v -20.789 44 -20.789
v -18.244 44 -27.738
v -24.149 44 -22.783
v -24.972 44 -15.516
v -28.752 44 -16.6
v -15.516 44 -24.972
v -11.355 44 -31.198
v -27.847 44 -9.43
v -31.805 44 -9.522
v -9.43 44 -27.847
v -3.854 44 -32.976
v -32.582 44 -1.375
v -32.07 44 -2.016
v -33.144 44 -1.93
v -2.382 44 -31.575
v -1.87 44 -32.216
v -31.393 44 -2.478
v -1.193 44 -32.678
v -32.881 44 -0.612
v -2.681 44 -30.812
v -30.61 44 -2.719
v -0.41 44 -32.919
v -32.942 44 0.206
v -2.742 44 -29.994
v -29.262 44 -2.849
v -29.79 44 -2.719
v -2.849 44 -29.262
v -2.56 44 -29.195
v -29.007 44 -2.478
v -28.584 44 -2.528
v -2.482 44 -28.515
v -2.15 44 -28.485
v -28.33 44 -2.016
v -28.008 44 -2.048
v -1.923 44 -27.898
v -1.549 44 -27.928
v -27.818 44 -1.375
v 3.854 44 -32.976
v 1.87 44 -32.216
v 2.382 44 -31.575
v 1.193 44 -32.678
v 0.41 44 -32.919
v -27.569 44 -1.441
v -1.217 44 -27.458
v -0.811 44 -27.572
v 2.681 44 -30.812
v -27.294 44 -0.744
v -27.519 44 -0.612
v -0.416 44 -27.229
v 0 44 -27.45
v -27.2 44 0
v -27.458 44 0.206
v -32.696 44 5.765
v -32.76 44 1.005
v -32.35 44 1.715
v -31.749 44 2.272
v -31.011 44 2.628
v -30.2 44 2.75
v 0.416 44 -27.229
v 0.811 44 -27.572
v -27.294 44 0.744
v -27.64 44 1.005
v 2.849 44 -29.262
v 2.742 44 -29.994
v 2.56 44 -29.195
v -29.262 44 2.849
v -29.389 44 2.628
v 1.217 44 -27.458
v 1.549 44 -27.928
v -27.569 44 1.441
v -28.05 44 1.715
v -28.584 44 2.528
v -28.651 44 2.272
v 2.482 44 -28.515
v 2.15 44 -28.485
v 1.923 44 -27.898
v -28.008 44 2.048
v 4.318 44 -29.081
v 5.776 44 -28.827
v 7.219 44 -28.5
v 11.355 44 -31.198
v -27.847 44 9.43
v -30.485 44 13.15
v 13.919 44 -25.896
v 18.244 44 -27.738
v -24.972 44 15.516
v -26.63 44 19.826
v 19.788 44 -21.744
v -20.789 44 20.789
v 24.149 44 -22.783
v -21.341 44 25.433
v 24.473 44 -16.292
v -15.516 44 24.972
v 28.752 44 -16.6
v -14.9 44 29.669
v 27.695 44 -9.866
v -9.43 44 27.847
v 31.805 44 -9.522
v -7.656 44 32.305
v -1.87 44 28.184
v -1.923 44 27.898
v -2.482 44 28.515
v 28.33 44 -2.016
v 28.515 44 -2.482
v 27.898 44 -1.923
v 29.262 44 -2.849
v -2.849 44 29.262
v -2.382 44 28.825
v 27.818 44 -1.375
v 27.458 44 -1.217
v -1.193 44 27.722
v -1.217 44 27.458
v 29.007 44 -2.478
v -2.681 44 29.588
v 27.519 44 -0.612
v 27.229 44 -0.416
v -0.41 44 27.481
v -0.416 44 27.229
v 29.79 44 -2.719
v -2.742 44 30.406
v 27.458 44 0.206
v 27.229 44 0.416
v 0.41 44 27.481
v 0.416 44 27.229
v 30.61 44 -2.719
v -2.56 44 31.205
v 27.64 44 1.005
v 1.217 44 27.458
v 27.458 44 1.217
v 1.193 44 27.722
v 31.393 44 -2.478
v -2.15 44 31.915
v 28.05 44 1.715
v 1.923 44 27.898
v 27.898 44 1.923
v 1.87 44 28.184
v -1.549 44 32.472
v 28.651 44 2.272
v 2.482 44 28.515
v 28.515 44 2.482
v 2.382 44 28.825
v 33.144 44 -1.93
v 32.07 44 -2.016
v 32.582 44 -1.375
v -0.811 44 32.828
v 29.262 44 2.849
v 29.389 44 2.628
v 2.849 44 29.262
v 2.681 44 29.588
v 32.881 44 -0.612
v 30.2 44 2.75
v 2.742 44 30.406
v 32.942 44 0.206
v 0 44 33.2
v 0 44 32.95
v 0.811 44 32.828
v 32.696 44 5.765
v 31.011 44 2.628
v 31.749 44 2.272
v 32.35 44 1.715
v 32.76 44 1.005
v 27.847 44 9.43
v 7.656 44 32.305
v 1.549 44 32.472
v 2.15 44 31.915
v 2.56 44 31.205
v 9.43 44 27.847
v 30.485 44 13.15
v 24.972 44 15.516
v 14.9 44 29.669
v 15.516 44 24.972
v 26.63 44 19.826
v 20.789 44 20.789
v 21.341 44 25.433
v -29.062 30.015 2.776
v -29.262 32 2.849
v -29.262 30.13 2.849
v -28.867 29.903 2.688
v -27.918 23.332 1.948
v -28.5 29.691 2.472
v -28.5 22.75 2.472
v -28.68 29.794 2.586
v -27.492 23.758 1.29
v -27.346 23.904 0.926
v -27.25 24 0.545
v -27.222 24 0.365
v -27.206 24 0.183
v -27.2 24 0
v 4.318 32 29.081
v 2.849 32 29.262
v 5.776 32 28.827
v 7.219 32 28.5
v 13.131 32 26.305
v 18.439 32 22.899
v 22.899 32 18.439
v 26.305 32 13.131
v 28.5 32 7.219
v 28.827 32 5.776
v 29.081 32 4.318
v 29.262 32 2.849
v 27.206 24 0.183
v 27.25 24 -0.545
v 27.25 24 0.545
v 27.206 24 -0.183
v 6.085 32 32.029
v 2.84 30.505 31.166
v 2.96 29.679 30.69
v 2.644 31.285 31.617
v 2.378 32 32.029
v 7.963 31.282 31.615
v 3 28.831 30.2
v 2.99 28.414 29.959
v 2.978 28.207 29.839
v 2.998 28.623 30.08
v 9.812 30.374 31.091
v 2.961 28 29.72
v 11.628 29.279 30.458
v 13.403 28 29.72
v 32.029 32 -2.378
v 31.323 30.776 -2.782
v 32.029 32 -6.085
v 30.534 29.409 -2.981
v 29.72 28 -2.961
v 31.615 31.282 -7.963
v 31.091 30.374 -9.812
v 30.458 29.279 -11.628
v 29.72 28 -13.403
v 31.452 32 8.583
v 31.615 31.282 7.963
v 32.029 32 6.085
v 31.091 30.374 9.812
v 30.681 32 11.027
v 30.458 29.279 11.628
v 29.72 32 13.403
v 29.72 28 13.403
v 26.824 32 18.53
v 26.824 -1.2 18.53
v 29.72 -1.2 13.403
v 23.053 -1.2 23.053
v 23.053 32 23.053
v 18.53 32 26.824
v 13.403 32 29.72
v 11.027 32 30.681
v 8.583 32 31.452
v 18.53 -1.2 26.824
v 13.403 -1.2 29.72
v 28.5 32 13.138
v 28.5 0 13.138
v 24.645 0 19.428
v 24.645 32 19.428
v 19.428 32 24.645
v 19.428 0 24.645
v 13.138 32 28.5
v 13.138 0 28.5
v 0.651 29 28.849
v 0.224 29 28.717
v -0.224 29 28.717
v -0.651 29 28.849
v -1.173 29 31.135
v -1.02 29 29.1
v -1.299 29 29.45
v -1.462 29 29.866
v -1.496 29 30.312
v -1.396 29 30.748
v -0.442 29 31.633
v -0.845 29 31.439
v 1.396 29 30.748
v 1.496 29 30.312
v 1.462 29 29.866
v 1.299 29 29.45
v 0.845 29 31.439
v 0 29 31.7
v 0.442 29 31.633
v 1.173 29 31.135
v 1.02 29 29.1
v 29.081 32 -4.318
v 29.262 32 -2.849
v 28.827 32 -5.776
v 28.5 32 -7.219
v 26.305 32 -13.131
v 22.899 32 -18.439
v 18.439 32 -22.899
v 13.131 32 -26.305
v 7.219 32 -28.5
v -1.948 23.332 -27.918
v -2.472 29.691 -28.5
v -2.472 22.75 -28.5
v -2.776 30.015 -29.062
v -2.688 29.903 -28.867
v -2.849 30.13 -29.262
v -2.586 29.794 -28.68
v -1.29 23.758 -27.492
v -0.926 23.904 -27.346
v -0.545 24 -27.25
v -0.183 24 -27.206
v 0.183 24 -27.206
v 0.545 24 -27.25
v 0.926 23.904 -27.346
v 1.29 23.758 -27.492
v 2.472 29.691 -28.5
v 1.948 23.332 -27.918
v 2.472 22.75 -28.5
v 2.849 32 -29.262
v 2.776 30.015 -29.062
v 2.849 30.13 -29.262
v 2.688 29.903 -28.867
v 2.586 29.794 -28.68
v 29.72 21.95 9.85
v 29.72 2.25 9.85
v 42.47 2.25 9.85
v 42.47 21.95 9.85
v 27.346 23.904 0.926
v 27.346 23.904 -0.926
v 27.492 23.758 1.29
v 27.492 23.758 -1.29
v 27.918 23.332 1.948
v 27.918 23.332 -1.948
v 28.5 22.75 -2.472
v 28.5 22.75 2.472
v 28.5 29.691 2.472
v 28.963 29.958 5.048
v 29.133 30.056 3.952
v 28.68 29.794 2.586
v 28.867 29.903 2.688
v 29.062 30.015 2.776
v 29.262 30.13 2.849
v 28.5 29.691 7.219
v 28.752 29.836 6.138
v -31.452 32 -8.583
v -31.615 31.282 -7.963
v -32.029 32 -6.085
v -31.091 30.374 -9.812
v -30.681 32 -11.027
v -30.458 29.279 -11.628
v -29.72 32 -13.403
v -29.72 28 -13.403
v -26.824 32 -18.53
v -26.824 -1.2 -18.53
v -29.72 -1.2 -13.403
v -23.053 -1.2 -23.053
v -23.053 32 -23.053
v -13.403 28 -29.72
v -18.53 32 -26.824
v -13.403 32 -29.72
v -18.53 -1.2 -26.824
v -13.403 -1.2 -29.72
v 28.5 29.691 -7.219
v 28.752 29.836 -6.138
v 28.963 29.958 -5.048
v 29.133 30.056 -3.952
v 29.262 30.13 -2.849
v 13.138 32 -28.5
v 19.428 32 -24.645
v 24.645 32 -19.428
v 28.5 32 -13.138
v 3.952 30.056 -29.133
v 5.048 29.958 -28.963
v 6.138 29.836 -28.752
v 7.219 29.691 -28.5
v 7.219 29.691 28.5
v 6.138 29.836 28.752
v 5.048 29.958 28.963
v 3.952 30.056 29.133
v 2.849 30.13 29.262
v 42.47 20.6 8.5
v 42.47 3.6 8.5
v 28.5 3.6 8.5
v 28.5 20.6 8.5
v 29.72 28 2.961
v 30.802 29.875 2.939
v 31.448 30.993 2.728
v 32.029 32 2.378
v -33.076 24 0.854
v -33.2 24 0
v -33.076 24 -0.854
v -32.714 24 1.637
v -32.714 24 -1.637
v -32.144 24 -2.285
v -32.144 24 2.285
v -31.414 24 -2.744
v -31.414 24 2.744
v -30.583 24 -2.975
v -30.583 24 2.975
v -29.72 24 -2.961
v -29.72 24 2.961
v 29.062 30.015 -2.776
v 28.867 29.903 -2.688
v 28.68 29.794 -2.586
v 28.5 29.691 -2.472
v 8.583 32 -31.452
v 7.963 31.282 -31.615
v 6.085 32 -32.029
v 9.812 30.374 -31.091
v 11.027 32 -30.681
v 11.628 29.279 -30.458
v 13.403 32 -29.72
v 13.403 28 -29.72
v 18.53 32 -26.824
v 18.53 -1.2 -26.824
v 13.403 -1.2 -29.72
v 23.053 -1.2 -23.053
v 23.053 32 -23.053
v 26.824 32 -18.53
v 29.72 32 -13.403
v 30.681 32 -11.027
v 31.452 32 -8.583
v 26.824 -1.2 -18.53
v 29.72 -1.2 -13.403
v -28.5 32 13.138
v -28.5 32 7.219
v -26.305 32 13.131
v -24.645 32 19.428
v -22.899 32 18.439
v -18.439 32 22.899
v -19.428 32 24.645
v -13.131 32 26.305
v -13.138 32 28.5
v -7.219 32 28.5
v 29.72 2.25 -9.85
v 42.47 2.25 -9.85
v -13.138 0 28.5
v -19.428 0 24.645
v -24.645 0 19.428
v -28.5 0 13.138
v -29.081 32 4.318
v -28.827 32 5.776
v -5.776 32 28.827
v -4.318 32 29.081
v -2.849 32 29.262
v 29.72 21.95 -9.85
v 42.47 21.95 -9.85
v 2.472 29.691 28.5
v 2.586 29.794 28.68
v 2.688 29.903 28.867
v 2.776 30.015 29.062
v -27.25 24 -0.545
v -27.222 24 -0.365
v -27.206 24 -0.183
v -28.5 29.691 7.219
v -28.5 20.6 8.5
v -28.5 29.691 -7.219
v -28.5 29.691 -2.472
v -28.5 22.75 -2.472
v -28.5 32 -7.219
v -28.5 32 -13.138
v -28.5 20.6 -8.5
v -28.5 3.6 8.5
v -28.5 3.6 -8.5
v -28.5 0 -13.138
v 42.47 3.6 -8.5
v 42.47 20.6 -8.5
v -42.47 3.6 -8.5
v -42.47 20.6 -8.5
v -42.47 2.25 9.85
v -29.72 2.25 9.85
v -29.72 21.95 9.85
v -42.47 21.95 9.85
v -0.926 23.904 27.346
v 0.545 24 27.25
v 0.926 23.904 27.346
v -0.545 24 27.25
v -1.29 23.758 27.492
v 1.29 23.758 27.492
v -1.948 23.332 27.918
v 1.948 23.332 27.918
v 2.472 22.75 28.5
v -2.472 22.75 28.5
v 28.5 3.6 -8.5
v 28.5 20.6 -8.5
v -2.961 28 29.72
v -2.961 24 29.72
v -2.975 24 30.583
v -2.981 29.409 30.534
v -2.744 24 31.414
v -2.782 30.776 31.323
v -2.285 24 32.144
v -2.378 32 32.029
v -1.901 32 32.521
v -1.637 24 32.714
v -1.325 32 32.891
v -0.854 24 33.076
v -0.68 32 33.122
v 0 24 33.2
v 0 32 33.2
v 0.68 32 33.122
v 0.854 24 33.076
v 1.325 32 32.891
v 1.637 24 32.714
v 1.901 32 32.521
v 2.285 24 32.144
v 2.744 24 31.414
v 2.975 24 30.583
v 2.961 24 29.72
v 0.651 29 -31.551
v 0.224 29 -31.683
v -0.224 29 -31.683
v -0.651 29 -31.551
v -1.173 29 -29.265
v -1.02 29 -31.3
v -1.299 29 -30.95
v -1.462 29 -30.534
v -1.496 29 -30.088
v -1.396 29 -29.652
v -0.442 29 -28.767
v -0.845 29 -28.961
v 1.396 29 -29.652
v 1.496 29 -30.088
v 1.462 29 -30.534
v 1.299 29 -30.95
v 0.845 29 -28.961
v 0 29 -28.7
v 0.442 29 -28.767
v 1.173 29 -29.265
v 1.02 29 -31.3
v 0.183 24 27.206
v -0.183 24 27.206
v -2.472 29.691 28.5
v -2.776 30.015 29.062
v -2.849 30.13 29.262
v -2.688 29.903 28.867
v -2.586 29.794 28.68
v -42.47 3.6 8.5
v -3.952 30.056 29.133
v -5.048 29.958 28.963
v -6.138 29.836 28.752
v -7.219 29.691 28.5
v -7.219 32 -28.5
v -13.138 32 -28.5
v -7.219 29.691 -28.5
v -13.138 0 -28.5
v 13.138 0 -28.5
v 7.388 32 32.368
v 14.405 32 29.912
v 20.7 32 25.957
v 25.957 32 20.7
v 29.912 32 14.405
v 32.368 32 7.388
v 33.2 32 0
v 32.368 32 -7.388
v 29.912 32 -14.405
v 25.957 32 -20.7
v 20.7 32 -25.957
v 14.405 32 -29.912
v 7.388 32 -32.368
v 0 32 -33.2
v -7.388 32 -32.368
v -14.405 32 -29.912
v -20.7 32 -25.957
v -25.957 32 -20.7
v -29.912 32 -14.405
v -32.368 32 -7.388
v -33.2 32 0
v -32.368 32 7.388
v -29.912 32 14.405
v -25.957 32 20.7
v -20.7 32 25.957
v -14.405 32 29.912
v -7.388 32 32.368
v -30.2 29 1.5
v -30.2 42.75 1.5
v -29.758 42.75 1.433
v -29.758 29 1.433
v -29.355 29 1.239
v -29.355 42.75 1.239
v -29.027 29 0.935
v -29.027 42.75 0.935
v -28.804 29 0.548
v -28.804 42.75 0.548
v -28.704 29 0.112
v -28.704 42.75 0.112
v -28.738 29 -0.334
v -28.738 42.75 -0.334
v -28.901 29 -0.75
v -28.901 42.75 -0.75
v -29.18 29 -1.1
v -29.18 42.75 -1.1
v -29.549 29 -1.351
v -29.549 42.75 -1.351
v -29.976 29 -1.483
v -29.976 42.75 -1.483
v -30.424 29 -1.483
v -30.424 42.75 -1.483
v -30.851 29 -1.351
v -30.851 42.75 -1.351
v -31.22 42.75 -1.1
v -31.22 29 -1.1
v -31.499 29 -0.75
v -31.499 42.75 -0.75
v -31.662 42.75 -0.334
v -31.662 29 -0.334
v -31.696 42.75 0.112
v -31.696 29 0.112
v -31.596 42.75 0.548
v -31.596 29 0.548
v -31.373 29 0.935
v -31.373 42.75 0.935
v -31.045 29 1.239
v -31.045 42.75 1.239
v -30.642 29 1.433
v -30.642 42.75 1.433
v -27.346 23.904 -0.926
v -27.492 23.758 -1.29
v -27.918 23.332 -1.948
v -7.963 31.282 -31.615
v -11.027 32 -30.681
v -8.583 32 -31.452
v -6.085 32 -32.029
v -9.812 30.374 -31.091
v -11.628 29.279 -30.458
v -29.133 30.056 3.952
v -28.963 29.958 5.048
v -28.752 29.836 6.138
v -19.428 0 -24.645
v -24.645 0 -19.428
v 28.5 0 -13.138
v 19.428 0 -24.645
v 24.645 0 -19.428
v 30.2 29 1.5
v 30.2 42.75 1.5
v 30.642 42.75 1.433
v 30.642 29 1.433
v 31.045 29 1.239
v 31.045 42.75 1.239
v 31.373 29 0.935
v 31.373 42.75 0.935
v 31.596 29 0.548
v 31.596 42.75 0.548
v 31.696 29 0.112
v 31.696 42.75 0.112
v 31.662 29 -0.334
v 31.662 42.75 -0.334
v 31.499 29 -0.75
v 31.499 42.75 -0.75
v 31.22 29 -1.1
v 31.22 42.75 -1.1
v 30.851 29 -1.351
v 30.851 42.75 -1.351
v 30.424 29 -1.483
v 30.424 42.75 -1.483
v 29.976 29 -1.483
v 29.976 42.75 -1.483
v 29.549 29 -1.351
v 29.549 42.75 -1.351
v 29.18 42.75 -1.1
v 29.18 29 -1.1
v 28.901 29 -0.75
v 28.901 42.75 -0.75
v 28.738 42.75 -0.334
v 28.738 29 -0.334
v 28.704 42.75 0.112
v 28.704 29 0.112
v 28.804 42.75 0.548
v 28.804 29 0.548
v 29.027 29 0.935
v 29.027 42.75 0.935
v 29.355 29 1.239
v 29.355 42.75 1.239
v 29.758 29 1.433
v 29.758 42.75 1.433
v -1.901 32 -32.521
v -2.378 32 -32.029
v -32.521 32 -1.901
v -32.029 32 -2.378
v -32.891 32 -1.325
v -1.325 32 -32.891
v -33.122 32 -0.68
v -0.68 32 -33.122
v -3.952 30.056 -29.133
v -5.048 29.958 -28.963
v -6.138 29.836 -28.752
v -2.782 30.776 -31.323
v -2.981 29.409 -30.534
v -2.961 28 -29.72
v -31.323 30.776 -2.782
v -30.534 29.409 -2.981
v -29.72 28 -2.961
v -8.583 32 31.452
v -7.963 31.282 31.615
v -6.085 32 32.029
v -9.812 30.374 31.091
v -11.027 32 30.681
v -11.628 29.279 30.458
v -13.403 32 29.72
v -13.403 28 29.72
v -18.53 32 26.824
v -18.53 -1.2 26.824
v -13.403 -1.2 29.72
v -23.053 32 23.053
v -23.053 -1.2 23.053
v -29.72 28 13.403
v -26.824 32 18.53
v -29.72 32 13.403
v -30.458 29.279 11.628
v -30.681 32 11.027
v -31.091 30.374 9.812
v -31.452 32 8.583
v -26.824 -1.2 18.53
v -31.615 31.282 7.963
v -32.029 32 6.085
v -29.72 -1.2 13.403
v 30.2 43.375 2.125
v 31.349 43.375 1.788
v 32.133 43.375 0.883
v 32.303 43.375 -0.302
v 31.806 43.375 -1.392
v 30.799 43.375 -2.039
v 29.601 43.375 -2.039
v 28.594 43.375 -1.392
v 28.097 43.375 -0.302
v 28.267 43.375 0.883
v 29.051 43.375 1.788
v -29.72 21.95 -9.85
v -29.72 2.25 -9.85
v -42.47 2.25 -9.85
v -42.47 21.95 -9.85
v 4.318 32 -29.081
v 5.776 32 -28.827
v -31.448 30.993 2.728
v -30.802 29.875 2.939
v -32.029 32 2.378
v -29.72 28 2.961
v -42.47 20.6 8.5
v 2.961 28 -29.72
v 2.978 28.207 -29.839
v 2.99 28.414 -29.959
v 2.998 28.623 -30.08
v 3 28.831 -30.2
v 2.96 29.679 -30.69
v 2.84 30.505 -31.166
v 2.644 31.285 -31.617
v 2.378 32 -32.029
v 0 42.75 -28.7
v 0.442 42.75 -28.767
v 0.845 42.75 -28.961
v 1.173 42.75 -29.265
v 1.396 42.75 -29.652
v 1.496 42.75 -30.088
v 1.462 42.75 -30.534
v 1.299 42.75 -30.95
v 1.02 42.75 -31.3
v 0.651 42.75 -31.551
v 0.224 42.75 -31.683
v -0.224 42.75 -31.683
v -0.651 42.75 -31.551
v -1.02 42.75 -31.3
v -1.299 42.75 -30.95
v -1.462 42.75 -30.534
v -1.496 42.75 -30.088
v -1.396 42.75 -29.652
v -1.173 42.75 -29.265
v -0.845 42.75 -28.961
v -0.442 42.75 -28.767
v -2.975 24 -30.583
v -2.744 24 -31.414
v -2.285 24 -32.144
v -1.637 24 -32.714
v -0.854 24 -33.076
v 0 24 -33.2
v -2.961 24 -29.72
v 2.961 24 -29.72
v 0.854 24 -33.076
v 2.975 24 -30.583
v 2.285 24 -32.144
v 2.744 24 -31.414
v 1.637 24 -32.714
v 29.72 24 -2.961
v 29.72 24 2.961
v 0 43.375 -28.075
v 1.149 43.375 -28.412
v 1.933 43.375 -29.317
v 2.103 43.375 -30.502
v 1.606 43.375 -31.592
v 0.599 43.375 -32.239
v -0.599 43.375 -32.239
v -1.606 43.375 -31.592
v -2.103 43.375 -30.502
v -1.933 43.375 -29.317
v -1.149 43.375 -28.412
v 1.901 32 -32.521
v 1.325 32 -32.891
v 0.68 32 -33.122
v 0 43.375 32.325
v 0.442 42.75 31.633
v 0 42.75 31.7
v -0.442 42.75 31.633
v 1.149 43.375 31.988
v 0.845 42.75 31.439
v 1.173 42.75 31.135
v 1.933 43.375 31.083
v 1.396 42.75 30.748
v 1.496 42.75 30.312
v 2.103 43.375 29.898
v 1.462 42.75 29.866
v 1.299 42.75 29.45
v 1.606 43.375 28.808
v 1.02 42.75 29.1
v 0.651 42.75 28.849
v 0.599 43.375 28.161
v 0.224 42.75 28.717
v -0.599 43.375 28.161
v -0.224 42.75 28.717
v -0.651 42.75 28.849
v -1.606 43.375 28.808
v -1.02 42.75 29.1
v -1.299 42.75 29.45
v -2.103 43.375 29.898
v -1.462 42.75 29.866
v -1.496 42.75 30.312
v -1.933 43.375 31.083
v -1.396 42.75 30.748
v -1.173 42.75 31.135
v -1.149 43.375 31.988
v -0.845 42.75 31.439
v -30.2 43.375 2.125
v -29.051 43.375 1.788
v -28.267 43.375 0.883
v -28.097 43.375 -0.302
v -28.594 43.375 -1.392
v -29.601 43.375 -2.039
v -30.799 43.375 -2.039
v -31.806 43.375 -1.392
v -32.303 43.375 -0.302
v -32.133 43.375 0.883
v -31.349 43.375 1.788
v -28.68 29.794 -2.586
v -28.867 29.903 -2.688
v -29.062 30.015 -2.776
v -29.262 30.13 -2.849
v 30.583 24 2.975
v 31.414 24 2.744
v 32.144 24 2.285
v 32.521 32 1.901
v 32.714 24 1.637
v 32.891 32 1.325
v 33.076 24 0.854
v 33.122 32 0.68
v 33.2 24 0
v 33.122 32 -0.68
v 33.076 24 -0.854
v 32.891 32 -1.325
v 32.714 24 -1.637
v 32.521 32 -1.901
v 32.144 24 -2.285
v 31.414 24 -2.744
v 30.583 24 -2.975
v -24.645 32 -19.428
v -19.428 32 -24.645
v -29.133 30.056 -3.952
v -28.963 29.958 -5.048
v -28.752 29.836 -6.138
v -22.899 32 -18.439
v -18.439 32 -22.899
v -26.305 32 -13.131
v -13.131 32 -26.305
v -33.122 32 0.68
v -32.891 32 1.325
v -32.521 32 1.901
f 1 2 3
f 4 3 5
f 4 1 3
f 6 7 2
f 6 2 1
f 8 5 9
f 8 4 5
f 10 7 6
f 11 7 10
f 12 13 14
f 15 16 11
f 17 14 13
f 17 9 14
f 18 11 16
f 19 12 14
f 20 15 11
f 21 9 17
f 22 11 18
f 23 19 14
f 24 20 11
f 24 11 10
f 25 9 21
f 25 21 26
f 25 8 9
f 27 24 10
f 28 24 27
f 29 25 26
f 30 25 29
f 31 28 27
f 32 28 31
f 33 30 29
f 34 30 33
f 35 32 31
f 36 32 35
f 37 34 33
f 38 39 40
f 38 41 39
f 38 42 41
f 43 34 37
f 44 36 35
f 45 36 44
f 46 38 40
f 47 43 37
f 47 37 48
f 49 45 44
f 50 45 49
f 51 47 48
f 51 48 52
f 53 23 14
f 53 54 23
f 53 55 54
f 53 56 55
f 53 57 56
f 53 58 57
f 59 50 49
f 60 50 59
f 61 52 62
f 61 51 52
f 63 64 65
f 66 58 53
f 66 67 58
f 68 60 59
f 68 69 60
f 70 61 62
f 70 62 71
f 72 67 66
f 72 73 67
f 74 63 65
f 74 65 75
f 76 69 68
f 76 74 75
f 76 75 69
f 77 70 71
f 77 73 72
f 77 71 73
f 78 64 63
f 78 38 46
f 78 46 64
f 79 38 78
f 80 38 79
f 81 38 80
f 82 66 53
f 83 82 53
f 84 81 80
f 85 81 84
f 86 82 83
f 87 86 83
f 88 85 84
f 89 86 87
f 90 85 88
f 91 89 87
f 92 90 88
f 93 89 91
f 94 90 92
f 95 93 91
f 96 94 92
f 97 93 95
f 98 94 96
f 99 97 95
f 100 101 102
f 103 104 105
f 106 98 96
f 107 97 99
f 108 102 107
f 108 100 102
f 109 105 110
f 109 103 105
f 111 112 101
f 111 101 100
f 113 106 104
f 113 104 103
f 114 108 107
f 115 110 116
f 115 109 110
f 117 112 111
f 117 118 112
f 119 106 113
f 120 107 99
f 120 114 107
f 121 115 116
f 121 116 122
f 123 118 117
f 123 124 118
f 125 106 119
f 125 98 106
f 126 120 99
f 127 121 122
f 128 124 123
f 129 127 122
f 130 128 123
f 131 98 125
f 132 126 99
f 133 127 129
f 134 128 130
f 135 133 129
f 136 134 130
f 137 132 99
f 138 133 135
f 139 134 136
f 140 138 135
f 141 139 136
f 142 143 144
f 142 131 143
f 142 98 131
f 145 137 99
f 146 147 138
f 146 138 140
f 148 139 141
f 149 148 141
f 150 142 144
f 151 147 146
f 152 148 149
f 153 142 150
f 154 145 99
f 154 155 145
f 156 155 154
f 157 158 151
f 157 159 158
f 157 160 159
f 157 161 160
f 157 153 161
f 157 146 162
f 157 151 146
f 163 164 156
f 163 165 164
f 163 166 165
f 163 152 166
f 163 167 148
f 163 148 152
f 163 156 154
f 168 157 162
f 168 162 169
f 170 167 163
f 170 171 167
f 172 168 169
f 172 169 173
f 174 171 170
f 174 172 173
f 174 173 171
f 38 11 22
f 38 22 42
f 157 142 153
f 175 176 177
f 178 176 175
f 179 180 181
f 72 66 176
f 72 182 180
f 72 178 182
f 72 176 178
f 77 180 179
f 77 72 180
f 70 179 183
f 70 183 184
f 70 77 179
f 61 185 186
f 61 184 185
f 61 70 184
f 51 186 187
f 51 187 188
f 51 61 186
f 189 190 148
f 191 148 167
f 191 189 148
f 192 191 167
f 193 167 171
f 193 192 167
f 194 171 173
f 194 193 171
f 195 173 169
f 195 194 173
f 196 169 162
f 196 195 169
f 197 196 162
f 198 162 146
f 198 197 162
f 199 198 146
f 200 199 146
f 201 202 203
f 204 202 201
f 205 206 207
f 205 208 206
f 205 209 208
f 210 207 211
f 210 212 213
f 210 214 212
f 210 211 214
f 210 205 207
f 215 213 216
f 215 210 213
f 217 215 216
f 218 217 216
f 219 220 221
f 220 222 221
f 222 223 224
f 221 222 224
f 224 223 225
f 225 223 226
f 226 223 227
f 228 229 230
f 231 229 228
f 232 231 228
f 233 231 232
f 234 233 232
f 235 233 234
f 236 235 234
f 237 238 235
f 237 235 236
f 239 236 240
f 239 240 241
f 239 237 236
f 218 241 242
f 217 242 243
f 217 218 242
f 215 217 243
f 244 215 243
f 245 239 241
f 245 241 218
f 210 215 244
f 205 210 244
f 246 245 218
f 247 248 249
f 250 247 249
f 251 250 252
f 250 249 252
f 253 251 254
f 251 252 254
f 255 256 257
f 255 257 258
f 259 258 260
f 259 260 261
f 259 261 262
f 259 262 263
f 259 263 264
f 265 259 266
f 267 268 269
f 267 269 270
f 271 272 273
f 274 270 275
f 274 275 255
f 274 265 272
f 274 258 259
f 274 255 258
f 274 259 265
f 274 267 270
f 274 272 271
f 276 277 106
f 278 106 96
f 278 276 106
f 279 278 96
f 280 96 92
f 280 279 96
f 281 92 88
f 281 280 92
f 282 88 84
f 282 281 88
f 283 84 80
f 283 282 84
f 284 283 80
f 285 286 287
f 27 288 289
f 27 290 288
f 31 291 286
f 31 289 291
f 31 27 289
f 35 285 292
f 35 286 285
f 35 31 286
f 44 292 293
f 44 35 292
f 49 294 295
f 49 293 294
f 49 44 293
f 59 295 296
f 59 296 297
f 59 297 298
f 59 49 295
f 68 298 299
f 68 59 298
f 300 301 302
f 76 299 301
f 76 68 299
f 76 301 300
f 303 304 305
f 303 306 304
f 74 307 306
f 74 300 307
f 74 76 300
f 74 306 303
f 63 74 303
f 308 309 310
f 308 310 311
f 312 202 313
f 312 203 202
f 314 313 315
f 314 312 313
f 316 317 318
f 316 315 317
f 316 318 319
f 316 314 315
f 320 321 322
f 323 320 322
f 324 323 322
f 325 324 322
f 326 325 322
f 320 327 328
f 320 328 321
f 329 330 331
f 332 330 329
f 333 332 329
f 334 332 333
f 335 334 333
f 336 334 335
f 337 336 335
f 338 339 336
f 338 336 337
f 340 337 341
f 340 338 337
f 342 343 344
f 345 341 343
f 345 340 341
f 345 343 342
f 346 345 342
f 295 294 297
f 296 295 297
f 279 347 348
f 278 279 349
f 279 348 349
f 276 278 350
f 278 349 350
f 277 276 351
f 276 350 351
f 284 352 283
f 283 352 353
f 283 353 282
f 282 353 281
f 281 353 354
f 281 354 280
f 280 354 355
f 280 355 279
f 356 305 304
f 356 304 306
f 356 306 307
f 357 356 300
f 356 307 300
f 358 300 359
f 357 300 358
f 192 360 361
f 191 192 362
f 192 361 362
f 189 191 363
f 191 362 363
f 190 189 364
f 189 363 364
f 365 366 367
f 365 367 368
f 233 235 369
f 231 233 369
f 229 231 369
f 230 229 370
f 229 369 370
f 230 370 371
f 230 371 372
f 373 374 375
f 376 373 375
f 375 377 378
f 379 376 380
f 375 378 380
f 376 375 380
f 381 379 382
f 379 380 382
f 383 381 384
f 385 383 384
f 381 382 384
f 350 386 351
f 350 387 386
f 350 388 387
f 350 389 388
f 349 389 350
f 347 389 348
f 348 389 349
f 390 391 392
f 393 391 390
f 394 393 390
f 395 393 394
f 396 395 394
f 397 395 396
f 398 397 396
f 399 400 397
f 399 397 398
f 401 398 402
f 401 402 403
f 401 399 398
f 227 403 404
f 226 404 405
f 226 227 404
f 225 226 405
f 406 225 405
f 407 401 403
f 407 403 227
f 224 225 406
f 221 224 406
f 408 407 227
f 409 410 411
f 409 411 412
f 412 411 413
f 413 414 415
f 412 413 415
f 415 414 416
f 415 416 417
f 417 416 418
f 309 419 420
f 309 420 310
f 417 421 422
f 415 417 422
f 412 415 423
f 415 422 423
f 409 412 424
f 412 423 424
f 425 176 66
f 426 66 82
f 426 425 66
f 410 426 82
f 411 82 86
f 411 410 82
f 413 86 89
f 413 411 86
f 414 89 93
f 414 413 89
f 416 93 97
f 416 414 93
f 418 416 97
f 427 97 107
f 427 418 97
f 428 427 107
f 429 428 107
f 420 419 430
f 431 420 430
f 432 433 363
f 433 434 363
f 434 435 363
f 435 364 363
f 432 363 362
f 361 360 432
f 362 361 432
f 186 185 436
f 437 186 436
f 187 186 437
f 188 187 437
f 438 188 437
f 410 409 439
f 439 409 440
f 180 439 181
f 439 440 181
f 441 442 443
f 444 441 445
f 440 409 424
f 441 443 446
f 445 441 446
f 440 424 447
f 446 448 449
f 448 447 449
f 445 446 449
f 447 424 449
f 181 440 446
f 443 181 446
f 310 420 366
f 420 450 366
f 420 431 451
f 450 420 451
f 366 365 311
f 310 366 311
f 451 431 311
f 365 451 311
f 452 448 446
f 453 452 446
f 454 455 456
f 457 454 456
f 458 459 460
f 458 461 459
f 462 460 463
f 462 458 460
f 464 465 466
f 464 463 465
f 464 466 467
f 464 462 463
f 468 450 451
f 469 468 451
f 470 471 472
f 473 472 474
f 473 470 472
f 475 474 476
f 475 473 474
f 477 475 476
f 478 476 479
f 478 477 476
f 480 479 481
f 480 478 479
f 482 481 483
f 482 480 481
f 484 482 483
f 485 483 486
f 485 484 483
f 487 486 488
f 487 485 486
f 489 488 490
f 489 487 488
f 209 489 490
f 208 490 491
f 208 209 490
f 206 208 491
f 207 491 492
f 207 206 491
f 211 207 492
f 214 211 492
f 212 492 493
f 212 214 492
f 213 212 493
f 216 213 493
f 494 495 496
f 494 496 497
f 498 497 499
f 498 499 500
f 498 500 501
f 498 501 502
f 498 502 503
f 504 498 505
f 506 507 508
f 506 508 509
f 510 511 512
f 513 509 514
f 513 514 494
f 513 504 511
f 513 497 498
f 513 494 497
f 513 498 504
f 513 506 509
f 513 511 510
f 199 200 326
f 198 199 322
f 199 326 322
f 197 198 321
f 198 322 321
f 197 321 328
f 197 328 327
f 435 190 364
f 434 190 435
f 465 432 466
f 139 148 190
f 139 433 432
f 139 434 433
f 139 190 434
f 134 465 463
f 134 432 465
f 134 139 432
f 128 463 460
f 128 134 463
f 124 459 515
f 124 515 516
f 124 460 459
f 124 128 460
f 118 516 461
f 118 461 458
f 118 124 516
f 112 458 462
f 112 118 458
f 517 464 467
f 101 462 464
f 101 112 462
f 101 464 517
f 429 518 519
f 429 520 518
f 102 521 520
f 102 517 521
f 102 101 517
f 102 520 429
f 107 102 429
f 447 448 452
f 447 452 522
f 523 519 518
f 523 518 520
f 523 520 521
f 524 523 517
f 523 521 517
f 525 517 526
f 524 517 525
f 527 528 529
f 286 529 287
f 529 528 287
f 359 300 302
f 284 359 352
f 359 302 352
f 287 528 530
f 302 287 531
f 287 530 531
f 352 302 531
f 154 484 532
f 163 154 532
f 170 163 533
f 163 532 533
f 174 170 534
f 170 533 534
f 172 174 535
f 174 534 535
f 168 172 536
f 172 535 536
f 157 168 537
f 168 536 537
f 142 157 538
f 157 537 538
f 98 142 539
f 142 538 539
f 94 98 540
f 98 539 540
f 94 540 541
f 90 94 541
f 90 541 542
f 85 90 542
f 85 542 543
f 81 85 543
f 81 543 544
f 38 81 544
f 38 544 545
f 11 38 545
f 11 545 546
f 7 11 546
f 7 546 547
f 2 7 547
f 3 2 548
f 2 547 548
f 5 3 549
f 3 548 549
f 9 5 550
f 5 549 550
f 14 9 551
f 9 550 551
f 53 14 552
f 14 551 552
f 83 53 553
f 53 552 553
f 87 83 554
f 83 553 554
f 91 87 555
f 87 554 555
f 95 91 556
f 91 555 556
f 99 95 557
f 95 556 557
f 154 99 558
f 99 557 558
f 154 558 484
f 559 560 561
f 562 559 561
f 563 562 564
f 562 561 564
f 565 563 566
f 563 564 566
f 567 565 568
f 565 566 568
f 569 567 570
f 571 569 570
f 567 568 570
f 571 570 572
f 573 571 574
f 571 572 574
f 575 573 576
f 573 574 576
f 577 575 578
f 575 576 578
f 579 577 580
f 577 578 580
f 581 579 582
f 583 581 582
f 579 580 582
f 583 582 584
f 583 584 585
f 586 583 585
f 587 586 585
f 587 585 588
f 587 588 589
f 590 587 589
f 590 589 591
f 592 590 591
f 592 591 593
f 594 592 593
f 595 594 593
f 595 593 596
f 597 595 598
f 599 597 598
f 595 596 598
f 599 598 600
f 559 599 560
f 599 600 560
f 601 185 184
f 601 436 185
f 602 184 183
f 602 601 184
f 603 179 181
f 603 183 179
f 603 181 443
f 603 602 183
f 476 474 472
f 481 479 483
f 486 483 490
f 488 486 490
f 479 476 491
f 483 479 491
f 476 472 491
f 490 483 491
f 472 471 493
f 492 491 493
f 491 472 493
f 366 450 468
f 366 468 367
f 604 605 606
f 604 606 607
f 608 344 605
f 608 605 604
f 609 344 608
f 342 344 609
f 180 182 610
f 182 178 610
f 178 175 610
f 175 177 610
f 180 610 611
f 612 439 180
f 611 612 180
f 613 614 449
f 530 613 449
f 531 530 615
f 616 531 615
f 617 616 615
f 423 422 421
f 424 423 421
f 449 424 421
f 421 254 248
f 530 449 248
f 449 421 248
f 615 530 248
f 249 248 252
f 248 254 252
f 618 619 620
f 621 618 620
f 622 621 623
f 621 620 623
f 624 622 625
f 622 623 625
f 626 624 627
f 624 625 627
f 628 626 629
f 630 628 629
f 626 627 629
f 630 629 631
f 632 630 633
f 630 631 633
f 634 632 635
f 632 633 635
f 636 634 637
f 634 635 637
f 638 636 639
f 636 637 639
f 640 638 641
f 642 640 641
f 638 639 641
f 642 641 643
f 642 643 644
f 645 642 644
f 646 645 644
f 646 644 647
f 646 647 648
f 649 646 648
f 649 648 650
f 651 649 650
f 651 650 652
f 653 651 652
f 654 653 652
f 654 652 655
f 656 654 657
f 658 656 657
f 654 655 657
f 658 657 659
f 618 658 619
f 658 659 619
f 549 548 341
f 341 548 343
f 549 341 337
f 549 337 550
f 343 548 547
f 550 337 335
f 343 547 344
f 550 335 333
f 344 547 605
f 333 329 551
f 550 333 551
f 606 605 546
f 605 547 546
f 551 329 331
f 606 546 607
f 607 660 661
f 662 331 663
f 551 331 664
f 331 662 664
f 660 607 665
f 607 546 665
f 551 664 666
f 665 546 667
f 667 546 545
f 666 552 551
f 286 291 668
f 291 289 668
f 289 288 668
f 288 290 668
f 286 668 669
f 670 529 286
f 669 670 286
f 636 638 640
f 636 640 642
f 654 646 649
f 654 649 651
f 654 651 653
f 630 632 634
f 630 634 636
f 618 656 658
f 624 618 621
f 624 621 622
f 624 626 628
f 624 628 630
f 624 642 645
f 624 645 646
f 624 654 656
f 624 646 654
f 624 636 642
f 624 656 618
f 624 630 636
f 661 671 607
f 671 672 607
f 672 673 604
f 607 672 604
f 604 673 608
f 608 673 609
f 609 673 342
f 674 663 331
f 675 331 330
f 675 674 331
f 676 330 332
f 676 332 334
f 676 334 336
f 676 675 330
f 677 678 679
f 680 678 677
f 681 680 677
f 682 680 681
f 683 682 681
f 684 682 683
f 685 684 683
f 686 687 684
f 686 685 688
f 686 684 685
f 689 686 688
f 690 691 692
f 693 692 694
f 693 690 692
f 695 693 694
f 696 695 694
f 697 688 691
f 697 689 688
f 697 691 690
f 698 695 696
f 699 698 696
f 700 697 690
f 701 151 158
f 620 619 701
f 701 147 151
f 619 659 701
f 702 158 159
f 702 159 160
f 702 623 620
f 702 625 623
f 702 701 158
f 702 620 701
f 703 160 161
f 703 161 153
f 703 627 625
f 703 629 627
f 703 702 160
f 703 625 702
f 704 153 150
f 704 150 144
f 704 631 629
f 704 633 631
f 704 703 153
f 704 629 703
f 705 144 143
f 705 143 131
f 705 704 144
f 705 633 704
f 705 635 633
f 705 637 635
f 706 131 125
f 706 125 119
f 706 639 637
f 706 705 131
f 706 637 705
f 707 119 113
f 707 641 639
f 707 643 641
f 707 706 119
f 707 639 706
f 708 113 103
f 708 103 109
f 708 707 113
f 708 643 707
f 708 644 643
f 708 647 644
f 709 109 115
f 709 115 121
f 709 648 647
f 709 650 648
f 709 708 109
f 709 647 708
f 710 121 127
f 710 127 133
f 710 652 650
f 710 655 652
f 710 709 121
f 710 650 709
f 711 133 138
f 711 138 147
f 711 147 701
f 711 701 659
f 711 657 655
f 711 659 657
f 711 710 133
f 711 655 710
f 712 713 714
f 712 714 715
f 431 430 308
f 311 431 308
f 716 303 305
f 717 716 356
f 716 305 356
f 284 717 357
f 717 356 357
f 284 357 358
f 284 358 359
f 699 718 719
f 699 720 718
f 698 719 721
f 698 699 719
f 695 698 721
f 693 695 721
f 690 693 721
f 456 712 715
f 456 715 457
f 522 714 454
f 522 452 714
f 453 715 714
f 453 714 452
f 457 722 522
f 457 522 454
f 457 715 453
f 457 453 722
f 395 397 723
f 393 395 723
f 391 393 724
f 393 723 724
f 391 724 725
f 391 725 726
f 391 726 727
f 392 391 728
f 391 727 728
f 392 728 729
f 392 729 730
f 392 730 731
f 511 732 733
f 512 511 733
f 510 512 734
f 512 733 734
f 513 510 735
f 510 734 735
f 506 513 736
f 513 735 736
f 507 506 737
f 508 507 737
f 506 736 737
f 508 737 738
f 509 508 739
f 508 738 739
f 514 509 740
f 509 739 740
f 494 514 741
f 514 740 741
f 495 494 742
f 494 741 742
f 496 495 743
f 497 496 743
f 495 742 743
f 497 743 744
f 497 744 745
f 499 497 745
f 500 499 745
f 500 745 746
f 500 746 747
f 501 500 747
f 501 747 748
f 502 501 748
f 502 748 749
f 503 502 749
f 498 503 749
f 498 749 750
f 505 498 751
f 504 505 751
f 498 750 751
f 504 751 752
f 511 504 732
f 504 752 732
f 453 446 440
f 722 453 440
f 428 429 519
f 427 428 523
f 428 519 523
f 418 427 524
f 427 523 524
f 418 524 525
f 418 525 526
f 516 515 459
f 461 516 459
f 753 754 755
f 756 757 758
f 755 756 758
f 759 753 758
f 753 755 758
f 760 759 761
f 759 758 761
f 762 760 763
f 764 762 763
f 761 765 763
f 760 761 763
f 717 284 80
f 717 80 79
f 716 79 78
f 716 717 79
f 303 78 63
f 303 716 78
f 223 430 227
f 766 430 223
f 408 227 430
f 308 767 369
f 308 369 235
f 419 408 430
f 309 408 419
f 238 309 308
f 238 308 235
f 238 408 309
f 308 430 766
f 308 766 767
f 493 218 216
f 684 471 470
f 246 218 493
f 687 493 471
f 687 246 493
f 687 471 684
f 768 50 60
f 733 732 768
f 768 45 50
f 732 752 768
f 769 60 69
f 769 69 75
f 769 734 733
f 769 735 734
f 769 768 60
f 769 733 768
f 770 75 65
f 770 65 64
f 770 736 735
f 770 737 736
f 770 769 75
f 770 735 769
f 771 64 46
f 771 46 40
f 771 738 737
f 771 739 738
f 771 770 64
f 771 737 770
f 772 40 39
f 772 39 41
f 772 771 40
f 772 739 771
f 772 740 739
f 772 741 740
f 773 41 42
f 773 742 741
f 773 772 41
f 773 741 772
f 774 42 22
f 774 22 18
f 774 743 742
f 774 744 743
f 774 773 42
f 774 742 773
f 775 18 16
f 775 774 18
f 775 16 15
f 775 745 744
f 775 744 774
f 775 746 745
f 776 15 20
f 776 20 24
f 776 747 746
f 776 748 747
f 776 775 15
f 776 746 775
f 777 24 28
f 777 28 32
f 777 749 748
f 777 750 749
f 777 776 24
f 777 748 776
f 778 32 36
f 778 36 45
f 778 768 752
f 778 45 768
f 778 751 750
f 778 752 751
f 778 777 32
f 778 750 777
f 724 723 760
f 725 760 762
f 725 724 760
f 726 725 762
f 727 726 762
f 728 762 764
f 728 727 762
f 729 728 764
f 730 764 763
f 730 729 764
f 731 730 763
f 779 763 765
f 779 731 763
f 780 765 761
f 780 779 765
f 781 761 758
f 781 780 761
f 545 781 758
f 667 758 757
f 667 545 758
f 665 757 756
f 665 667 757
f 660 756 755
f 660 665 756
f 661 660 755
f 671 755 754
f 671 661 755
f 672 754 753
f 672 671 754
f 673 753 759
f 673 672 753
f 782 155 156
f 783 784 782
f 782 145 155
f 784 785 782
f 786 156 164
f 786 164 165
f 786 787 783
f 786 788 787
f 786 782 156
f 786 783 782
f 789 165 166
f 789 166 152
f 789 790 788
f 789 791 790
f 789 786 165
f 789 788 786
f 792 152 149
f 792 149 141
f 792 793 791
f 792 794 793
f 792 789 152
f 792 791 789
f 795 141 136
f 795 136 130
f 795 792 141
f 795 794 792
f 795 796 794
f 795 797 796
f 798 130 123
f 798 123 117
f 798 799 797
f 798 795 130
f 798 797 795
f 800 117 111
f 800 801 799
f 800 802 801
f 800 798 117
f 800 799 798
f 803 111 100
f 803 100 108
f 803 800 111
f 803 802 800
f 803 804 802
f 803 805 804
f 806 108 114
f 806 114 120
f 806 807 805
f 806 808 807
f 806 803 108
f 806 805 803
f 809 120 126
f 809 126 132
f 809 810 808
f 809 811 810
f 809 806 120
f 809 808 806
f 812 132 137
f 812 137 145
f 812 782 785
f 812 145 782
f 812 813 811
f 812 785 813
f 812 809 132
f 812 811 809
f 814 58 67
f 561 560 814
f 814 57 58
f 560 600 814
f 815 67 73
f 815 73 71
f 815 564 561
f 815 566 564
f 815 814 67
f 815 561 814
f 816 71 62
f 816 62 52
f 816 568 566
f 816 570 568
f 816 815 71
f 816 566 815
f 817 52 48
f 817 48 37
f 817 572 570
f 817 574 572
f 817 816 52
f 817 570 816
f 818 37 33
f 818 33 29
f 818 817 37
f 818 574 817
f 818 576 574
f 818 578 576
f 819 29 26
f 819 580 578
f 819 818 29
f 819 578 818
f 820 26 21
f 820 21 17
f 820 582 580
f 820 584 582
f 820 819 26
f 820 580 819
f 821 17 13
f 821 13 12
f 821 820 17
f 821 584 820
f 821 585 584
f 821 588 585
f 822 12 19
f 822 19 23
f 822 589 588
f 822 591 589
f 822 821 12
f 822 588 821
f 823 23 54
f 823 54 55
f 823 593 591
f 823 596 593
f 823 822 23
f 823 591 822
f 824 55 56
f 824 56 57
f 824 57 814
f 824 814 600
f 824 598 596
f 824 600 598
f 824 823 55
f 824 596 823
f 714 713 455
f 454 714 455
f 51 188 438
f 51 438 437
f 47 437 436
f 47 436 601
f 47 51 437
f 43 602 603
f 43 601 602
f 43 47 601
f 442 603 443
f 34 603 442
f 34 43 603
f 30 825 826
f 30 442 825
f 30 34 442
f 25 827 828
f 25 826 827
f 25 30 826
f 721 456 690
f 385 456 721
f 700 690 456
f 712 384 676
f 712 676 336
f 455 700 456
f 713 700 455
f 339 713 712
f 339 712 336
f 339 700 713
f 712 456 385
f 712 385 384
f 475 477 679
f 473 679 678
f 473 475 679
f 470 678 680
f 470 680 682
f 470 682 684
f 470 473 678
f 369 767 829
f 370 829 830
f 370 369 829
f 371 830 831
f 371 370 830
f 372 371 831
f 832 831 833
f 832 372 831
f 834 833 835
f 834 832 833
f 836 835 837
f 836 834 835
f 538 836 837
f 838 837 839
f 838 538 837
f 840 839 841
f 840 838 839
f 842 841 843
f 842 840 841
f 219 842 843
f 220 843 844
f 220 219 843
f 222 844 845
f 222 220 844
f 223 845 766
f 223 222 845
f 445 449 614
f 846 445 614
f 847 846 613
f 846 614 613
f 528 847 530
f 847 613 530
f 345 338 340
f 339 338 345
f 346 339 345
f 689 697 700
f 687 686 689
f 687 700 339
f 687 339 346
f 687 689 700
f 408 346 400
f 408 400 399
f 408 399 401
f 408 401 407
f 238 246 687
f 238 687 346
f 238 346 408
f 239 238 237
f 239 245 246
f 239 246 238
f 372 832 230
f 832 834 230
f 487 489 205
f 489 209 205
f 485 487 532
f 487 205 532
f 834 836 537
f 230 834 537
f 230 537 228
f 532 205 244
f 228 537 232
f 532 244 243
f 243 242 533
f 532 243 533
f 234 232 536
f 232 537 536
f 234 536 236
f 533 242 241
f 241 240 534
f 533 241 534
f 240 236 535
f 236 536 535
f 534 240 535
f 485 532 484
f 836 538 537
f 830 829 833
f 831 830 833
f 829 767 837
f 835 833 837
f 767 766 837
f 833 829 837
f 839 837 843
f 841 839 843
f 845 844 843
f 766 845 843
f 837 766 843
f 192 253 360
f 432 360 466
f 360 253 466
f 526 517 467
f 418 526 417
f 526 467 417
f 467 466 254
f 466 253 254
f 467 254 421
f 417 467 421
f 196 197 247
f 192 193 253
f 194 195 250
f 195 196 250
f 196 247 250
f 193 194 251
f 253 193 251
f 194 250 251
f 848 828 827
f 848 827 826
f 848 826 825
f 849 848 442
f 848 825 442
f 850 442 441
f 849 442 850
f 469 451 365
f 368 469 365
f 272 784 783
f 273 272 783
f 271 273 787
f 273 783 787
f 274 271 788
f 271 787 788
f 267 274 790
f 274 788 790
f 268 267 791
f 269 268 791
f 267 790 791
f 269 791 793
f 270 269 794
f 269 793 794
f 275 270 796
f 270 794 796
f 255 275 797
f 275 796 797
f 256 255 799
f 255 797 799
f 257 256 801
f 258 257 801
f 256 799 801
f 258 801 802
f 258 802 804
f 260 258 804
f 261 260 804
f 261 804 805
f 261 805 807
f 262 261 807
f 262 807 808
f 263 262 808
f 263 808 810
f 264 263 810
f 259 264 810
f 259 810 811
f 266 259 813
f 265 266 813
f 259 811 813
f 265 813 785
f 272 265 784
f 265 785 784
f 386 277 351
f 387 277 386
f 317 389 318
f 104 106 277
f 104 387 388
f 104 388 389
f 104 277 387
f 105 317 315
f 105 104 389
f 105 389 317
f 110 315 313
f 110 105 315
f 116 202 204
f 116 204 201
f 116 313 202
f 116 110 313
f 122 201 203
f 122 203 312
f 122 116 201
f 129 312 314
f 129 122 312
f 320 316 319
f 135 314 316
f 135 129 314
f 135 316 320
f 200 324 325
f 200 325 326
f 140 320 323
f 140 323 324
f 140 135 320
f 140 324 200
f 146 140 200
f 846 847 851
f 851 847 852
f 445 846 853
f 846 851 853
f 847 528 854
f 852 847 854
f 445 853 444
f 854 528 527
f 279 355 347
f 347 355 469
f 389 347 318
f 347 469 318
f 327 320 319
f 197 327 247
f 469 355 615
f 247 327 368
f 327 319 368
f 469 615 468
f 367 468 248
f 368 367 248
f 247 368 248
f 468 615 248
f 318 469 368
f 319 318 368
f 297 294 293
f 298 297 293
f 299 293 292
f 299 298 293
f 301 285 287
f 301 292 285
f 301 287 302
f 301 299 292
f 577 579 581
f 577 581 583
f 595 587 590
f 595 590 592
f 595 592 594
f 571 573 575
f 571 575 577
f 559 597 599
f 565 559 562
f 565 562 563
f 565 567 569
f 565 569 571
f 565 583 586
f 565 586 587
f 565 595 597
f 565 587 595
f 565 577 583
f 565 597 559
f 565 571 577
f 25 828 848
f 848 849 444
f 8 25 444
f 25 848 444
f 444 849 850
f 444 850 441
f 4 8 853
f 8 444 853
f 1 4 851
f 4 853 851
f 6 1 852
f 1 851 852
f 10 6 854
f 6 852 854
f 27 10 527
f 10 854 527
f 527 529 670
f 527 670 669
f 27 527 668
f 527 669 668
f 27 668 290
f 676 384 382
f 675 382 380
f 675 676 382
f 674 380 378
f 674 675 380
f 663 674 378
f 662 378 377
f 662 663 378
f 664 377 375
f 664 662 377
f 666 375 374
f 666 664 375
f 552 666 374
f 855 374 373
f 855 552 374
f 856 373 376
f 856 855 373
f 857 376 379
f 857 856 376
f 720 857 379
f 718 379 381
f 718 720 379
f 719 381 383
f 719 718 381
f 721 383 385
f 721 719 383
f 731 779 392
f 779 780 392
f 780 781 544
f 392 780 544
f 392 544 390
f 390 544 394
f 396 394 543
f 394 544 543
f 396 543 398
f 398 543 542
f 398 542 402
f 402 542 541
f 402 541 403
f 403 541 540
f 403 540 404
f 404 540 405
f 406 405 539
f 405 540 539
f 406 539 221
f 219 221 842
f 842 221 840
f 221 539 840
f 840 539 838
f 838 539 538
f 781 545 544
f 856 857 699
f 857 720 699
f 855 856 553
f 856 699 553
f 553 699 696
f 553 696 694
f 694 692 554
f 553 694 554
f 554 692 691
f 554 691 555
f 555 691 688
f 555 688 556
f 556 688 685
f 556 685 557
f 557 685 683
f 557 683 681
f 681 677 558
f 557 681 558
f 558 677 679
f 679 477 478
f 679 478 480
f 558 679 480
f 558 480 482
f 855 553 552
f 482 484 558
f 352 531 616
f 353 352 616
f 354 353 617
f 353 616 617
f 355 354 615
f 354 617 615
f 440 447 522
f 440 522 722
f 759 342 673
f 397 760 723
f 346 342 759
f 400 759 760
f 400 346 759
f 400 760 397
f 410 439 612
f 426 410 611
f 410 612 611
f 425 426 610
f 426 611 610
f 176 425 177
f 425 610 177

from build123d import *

# Parameters (mm, degrees)
EXTRUDE_THIN1_DEPTH     = 32
SKETCH2_R               = 33.2
SKETCH2_R_2             = 29.4
BOSS_EXTRUDE1_DEPTH     = 12
CHAMFER1_SIZE           = 4
CHAMFER1_SIZE_2         = 2.309401077
SKETCH3_R               = 3
BOSS_EXTRUDE2_DEPTH     = 20
CHAMFER2_SIZE           = 1.25
SKETCH5_W               = 19.7
SKETCH5_H               = 19.7
BOSS_EXTRUDE3_DEPTH     = 12.75
CUT_EXTRUDE1_DEPTH      = 102.25731381
CUT_EXTRUDE1_DEPTH_BACK = 102.25731381
SKETCH6_W               = 17
SKETCH6_H               = 17
BOSS_EXTRUDE4_START     = 1.2
BOSS_EXTRUDE4_DEPTH     = 1.2
SKETCH8_R               = 1.5
CUT_EXTRUDE2_DEPTH      = 15
CHAMFER3_SIZE           = 1.25


with BuildPart() as part:
    # Sketch1 → Extrude-Thin1 (new body)
    with BuildSketch(Plane(origin=(0, 0, 0), x_dir=(1, 0, 0), z_dir=(0, 1, 0))):
        with BuildLine():
            Line((29.72, 13.402792694), (29.72, -13.402792694))
            ThreePointArc((29.72, -13.402792694), (23.053343055, -23.053343055), (13.402792694, -29.72))
            Line((13.402792694, -29.72), (-13.402792694, -29.72))
            ThreePointArc((-13.402792694, -29.72), (-23.053343055, -23.053343055), (-29.72, -13.402792694))
            Line((-29.72, -13.402792694), (-29.72, 13.402792694))
            ThreePointArc((-29.72, 13.402792694), (-23.053343055, 23.053343055), (-13.402792694, 29.72))
            Line((-13.402792694, 29.72), (13.402792694, 29.72))
            ThreePointArc((13.402792694, 29.72), (23.053343055, 23.053343055), (29.72, 13.402792694))
        make_face()
        with BuildLine():
            Line((28.5, 13.137804878), (28.5, -13.137804878))
            ThreePointArc((28.5, -13.137804878), (22.190672782, -22.190672782), (13.137804878, -28.5))
            Line((13.137804878, -28.5), (-13.137804878, -28.5))
            ThreePointArc((-13.137804878, -28.5), (-22.190672782, -22.190672782), (-28.5, -13.137804878))
            Line((-28.5, -13.137804878), (-28.5, 13.137804878))
            ThreePointArc((-28.5, 13.137804878), (-22.190672782, 22.190672782), (-13.137804878, 28.5))
            Line((-13.137804878, 28.5), (13.137804878, 28.5))
            ThreePointArc((13.137804878, 28.5), (22.190672782, 22.190672782), (28.5, 13.137804878))
        make_face(mode=Mode.SUBTRACT)
    extrude(amount=EXTRUDE_THIN1_DEPTH)

    # Sketch2 → Boss-Extrude1 (add)
    with BuildSketch(Plane(origin=(0, 32, 0), x_dir=(1, 0, 0), z_dir=(0, 1, 0))):
        with Locations(Location((0, 0, 0), (0, 0, 270))):
            Circle(SKETCH2_R)
        with Locations(Location((0, 0, 0), (0, 0, 75.786553976))):
            Circle(SKETCH2_R_2, mode=Mode.SUBTRACT)
    extrude(amount=BOSS_EXTRUDE1_DEPTH)

    # Chamfer1
    # the kernel refuses this chamfer: 4, 2.309401077 mm, written as the material it adds along each edge
    with BuildSketch(Plane(origin=(-23.751135713, 32, -29.72), x_dir=(0, -0.9998132206222079, 0.01932676561270115), z_dir=(1, 0, 0))) as chamfer1_piece_1_section:
        Polygon((CHAMFER1_SIZE * 0.999813220622, CHAMFER1_SIZE * 0.0193267656127), (-CHAMFER1_SIZE_2 * 0.0193267656107, CHAMFER1_SIZE_2 * 0.999813220518), (0, 0), align=None)
    chamfer1_piece_1 = extrude(amount=47.502271426, mode=Mode.PRIVATE)
    chamfer1_piece_1 = chamfer1_piece_1 & Plane(origin=(0, 30.60321443, 0), x_dir=(0.41109897069605716, 0, -0.9115907175331714), z_dir=(0, -1, 0)) * Cylinder(32.602350406, 112, mode=Mode.PRIVATE)
    add(chamfer1_piece_1)
    with BuildSketch(Plane(origin=(-29.72, 32, 23.751135713), x_dir=(-0.9983227437537925, 0.05789386240267119, 0), z_dir=(0, 0, -1))) as chamfer1_piece_2_section:
        Polygon((CHAMFER1_SIZE_2 * 0.998322743649, -CHAMFER1_SIZE_2 * 0.0578938623966), (-CHAMFER1_SIZE * 0.0578938624027, -CHAMFER1_SIZE * 0.998322743754), (0, 0), align=None)
    chamfer1_piece_2 = extrude(amount=47.502271426, mode=Mode.PRIVATE)
    chamfer1_piece_2 = chamfer1_piece_2 & Plane(origin=(0, 30.60321443, 0), x_dir=(-0.9115907175331723, 0, -0.41109897069605533), z_dir=(0, -1, 0)) * Cylinder(32.602350406, 111, mode=Mode.PRIVATE)
    add(chamfer1_piece_2)
    with BuildSketch(Plane(origin=(23.751135713, 32, 29.72), x_dir=(0, 0.0578938624026711, 0.9983227437537925), z_dir=(-1, 0, 0))) as chamfer1_piece_3_section:
        Polygon((CHAMFER1_SIZE_2 * 0.998322743649, -CHAMFER1_SIZE_2 * 0.0578938623966), (-CHAMFER1_SIZE * 0.0578938624027, -CHAMFER1_SIZE * 0.998322743754), (0, 0), align=None)
    chamfer1_piece_3 = extrude(amount=47.502271426, mode=Mode.PRIVATE)
    chamfer1_piece_3 = chamfer1_piece_3 & Plane(origin=(0, 30.60321443, 0), x_dir=(0.9115907175331722, 0, 0.4110989706960556), z_dir=(0, -1, 0)) * Cylinder(32.602350406, 111, mode=Mode.PRIVATE)
    add(chamfer1_piece_3)
    with BuildSketch(Plane(origin=(29.72, 32, -23.751135713), x_dir=(-0.01932676561270115, -0.9998132206222079, 0), z_dir=(0, 0, 1))) as chamfer1_piece_4_section:
        Polygon((CHAMFER1_SIZE * 0.999813220622, CHAMFER1_SIZE * 0.0193267656127), (-CHAMFER1_SIZE_2 * 0.0193267656107, CHAMFER1_SIZE_2 * 0.999813220518), (0, 0), align=None)
    chamfer1_piece_4 = extrude(amount=47.502271426, mode=Mode.PRIVATE)
    chamfer1_piece_4 = chamfer1_piece_4 & Plane(origin=(0, 30.60321443, 0), x_dir=(0.41109897069605716, 0, -0.9115907175331714), z_dir=(0, -1, 0)) * Cylinder(32.602350406, 112, mode=Mode.PRIVATE)
    add(chamfer1_piece_4)
    # the kernel refuses this chamfer: 4, 2.309401077 mm, written as the material it takes off along each edge
    with BuildSketch(Plane(origin=(-17.567068668, 32, -28.5), x_dir=(0, 0.019326765612700306, -0.9998132206222079), z_dir=(1, 0, 0))) as chamfer1_2_piece_1_section:
        Polygon((CHAMFER1_SIZE * 0.999813220622, -CHAMFER1_SIZE * 0.0193267656127), (-CHAMFER1_SIZE_2 * 0.0193267656107, -CHAMFER1_SIZE_2 * 0.999813220518), (0, 0), align=None)
    chamfer1_2_piece_1 = extrude(amount=35.134137336, mode=Mode.PRIVATE)
    chamfer1_2_piece_1 = chamfer1_2_piece_1 & Plane(origin=(0, 30.944951594, 0), x_dir=(0.2455348860263091, 0, -0.9693877551032133), z_dir=(0, -1, 0)) * Cylinder(29.4, 87, mode=Mode.PRIVATE)
    add(chamfer1_2_piece_1, mode=Mode.SUBTRACT)
    with BuildSketch(Plane(origin=(17.567068668, 32, 28.5), x_dir=(0, 0.01932676561270029, 0.9998132206222079), z_dir=(-1, 0, 0))) as chamfer1_2_piece_2_section:
        Polygon((CHAMFER1_SIZE * 0.999813220622, -CHAMFER1_SIZE * 0.0193267656127), (-CHAMFER1_SIZE_2 * 0.0193267656107, -CHAMFER1_SIZE_2 * 0.999813220518), (0, 0), align=None)
    chamfer1_2_piece_2 = extrude(amount=35.134137336, mode=Mode.PRIVATE)
    chamfer1_2_piece_2 = chamfer1_2_piece_2 & Plane(origin=(0, 30.944951594, 0), x_dir=(0.2455348860263091, 0, -0.9693877551032133), z_dir=(0, -1, 0)) * Cylinder(29.4, 87, mode=Mode.PRIVATE)
    add(chamfer1_2_piece_2, mode=Mode.SUBTRACT)
    with BuildSketch(Plane(origin=(-28.5, 32, 17.567068668), x_dir=(-0.9998132206222079, 0.019326765612700306, 0), z_dir=(0, 0, -1))) as chamfer1_2_piece_3_section:
        Polygon((CHAMFER1_SIZE * 0.999813220622, -CHAMFER1_SIZE * 0.0193267656127), (-CHAMFER1_SIZE_2 * 0.0193267656107, -CHAMFER1_SIZE_2 * 0.999813220518), (0, 0), align=None)
    chamfer1_2_piece_3 = extrude(amount=35.134137336, mode=Mode.PRIVATE)
    chamfer1_2_piece_3 = chamfer1_2_piece_3 & Plane(origin=(0, 30.944951594, 0), x_dir=(0.2455348860263091, 0, -0.9693877551032133), z_dir=(0, -1, 0)) * Cylinder(29.4, 87, mode=Mode.PRIVATE)
    add(chamfer1_2_piece_3, mode=Mode.SUBTRACT)
    with BuildSketch(Plane(origin=(28.5, 32, -17.567068668), x_dir=(-0.0578938624026711, -0.9983227437537925, 0), z_dir=(0, 0, 1))) as chamfer1_2_piece_4_section:
        Polygon((CHAMFER1_SIZE_2 * 0.998322743649, CHAMFER1_SIZE_2 * 0.0578938623966), (-CHAMFER1_SIZE * 0.0578938624027, CHAMFER1_SIZE * 0.998322743754), (0, 0), align=None)
    chamfer1_2_piece_4 = extrude(amount=35.134137336, mode=Mode.PRIVATE)
    chamfer1_2_piece_4 = chamfer1_2_piece_4 & Plane(origin=(0, 30.944951594, 0), x_dir=(0.2455348860263091, 0, -0.9693877551032133), z_dir=(0, -1, 0)) * Cylinder(29.4, 87, mode=Mode.PRIVATE)
    add(chamfer1_2_piece_4, mode=Mode.SUBTRACT)

    # Sketch3 → Boss-Extrude2 (add)
    with BuildSketch(Plane(origin=(0, 44, 0), x_dir=(1, 0, 0), z_dir=(0, 1, 0))):
        with Locations((0, 30.2)):
            Circle(SKETCH3_R)
        with Locations((30.2, 0)):
            Circle(SKETCH3_R)
        with Locations((0, -30.2)):
            Circle(SKETCH3_R)
        with Locations((-30.2, 0)):
            Circle(SKETCH3_R)
    extrude(amount=-BOSS_EXTRUDE2_DEPTH)

    # Chamfer2
    chamfer2_edges = [part.edges().sort_by_distance(p)[0] for p in [
        (0, 24, -28.5),
        (28.5, 24, 0),
        (0, 24, 28.5),
        (-28.5, 24, 0),
    ]]
    chamfer(chamfer2_edges, length=CHAMFER2_SIZE)

    # Sketch5 → Boss-Extrude3 (add)
    with BuildSketch(Plane.ZY.offset(29.72)):
        with Locations((0, 12.1)):
            Rectangle(SKETCH5_W, SKETCH5_H)
    boss_extrude3 = extrude(amount=BOSS_EXTRUDE3_DEPTH)

    # Mirror1: Boss-Extrude3 across plane
    add(boss_extrude3.mirror(Plane(origin=(0, 0, 0), x_dir=(0, 0, 1), z_dir=(1, 0, 0))))

    # Sketch6 → Cut-Extrude1 (cut, two sides: drawn at the far end of the back side and taken through both)
    with BuildSketch(Plane.ZY.offset(42.47).offset(-CUT_EXTRUDE1_DEPTH_BACK)):
        with Locations((0, 12.1)):
            Rectangle(SKETCH6_W, SKETCH6_H)
    extrude(amount=CUT_EXTRUDE1_DEPTH + CUT_EXTRUDE1_DEPTH_BACK, mode=Mode.SUBTRACT)

    # Sketch7 → Boss-Extrude4 (add)
    with BuildSketch(Plane.XZ.offset(BOSS_EXTRUDE4_START)):
        with BuildLine():
            Line((29.72, -13.402792694), (29.72, 13.402792694))
            ThreePointArc((29.72, 13.402792694), (23.053343055, 23.053343055), (13.402792694, 29.72))
            Line((13.402792694, 29.72), (-13.402792694, 29.72))
            ThreePointArc((-13.402792694, 29.72), (-23.053343055, 23.053343055), (-29.72, 13.402792694))
            Line((-29.72, 13.402792694), (-29.72, -13.402792694))
            ThreePointArc((-29.72, -13.402792694), (-23.053343055, -23.053343055), (-13.402792694, -29.72))
            Line((-13.402792694, -29.72), (13.402792694, -29.72))
            ThreePointArc((13.402792694, -29.72), (23.053343055, -23.053343055), (29.72, -13.402792694))
        make_face()
    extrude(amount=-BOSS_EXTRUDE4_DEPTH)

    # Sketch8 → Cut-Extrude2 (cut)
    with BuildSketch(Plane(origin=(0, 44, 0), x_dir=(1, 0, 0), z_dir=(0, 1, 0))):
        with Locations(Location((0, 30.2, 0), (0, 0, 270))):
            Circle(SKETCH8_R)
        with Locations(Location((30.2, 0, 0), (0, 0, 270))):
            Circle(SKETCH8_R)
        with Locations(Location((0, -30.2, 0), (0, 0, 270))):
            Circle(SKETCH8_R)
        with Locations(Location((-30.2, 0, 0), (0, 0, 270))):
            Circle(SKETCH8_R)
    extrude(amount=-CUT_EXTRUDE2_DEPTH, mode=Mode.SUBTRACT)

    # Chamfer3
    chamfer3_edges = [part.edges().sort_by_distance(p)[0] for p in [
        (0, 44, -31.7),
        (30.2, 44, -1.5),
        (0, 44, 28.7),
        (-30.2, 44, -1.5),
    ]]
    chamfer(chamfer3_edges, length=CHAMFER3_SIZE)


solid = part.part
